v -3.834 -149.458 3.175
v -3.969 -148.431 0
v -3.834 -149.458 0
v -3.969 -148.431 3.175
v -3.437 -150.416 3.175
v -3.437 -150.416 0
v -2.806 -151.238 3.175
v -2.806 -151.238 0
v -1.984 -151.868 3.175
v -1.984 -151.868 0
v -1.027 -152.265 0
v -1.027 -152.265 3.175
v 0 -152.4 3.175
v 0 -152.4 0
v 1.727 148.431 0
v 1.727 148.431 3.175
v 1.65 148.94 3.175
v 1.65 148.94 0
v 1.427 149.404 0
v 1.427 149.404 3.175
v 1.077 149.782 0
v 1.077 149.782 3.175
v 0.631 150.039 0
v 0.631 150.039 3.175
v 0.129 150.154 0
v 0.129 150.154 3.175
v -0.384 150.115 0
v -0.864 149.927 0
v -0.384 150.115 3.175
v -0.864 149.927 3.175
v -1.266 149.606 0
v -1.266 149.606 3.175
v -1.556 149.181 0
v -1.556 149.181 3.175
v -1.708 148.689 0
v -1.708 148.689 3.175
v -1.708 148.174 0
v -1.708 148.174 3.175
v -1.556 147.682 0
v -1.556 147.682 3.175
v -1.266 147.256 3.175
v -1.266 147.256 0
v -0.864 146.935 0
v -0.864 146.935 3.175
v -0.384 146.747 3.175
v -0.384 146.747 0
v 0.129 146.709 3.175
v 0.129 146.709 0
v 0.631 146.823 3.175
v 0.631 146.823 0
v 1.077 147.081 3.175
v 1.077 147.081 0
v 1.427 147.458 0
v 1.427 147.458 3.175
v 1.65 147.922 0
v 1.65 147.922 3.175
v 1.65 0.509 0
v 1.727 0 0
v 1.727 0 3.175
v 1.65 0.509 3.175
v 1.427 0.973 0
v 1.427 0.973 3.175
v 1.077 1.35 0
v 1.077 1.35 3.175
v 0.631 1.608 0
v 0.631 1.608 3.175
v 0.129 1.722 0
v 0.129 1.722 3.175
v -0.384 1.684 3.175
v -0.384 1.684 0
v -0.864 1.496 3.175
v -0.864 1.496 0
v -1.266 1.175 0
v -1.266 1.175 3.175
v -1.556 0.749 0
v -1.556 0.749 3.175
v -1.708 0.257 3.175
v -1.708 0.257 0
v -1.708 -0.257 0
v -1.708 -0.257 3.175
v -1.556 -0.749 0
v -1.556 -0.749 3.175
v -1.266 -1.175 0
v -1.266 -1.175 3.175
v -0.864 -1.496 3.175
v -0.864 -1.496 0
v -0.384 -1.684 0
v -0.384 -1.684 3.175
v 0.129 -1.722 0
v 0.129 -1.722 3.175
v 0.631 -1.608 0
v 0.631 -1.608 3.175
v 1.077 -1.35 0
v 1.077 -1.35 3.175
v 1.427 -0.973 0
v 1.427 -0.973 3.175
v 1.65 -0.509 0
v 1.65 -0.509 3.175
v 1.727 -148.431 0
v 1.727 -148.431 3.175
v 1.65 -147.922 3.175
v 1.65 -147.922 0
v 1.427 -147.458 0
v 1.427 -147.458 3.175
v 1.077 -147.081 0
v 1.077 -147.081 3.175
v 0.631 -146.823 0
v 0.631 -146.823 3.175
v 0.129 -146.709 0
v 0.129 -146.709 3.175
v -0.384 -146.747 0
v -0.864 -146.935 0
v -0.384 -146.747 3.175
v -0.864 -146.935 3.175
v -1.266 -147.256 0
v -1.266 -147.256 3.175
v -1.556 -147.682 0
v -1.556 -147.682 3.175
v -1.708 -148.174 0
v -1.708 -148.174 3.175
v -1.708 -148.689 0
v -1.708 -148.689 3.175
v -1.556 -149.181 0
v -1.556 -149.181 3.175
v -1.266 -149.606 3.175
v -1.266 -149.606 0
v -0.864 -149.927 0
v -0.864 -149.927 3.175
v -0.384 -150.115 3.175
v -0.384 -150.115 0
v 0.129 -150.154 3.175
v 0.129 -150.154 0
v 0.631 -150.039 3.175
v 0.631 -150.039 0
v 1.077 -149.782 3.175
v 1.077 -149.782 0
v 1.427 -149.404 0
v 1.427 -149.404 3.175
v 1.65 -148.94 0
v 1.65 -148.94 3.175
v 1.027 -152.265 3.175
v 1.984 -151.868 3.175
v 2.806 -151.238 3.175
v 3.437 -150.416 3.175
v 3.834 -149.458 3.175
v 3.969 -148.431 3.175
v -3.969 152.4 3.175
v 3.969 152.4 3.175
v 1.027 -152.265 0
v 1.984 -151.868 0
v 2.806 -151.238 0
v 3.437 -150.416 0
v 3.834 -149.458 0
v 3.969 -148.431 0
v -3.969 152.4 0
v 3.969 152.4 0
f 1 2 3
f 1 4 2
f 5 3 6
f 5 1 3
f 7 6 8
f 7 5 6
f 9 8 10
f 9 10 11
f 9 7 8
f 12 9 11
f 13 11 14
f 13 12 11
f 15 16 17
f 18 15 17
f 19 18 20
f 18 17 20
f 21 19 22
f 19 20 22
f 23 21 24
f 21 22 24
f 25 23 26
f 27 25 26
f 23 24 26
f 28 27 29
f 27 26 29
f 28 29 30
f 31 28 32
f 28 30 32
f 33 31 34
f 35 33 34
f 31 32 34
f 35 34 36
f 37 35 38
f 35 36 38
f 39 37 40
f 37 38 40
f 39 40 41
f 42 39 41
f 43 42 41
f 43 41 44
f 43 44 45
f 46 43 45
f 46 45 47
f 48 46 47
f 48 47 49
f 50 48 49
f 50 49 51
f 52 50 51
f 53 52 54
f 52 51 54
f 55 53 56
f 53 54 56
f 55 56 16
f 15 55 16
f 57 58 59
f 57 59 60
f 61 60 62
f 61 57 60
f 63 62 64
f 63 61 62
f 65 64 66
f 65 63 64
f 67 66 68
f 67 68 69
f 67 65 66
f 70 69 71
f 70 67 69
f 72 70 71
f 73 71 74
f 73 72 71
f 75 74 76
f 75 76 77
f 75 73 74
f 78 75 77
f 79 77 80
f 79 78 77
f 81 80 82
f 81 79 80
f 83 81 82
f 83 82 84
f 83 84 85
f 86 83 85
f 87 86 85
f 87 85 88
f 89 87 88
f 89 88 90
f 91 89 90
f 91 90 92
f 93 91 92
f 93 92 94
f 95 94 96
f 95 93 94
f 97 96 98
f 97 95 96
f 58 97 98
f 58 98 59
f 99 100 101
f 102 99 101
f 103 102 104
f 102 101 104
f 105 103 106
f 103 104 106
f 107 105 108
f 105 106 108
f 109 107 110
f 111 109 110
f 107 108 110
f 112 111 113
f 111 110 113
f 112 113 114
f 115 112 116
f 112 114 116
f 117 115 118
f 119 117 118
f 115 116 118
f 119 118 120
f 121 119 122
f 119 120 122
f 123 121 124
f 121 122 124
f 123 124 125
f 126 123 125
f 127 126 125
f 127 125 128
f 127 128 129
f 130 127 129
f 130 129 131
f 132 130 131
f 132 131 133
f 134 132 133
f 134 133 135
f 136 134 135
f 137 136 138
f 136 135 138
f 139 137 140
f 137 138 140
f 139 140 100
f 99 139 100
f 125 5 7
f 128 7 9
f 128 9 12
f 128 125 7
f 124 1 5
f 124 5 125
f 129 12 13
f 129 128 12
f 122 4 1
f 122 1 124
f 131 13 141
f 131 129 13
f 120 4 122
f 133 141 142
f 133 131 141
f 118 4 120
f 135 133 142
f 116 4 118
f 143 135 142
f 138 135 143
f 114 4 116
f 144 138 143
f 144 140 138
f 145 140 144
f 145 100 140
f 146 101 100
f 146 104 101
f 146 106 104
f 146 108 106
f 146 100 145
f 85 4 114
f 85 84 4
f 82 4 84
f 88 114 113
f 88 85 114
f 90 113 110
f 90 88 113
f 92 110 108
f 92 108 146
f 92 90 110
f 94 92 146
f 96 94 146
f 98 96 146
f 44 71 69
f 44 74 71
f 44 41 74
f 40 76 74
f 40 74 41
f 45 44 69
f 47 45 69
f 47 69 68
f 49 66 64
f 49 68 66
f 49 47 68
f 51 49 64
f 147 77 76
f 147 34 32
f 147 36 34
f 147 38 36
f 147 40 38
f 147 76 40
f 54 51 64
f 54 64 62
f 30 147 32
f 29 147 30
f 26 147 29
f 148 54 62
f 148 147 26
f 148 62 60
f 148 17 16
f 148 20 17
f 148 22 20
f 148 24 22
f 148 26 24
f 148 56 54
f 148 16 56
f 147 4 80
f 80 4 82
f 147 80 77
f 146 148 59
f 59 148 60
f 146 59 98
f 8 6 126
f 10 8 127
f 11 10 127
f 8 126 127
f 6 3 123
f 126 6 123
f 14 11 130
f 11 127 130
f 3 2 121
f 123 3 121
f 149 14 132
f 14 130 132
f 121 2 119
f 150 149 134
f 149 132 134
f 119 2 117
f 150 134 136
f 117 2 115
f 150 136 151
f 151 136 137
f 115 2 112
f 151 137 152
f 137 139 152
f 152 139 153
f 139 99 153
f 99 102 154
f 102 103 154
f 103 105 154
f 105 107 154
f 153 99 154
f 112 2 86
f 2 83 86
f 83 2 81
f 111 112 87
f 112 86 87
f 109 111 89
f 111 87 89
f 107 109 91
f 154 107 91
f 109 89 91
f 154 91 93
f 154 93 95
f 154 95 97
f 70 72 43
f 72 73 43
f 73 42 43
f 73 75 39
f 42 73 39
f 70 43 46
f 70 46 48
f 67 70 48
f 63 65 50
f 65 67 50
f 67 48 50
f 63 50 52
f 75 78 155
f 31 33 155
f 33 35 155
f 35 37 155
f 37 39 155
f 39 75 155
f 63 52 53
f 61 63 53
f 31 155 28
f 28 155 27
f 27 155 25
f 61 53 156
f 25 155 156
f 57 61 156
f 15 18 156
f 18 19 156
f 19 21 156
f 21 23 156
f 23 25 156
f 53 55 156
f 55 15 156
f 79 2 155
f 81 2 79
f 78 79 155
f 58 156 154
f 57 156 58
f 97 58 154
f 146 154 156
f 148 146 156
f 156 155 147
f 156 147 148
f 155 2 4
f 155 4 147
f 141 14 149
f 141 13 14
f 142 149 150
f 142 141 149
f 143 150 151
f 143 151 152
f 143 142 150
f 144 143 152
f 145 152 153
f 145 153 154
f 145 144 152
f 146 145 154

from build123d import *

# Parameters (mm, degrees)
F0_W     = 7.9375
F0_H     = 304.8
F0_R     = 1.7272
F1_DEPTH = 3.175
F2_R     = 1.7272
F3_DEPTH = 3.175
F4_R     = 3.96874


# Not quite as in the source:
# - a fillet or chamfer is up to 0.001 mm smaller than in the source, because OpenCascade refuses the exact size


with BuildPart() as f1:
    # F0 (on Top) → F1 (new body)
    with BuildSketch(Plane.XY):
        Rectangle(F0_W, F0_H)
        Circle(F0_R, mode=Mode.SUBTRACT)
    extrude(amount=F1_DEPTH)

    # F2 (on face) → F3 (cut, through all)
    with BuildSketch(Plane.XY.offset(3.175)):
        with Locations((0, 148.43125)):
            Circle(F2_R)
        with Locations((0, -148.43125)):
            Circle(F2_R)
    extrude(amount=-F3_DEPTH, mode=Mode.SUBTRACT)

    # F4 (radius 3.96875 in the source; OpenCascade refuses exactly that, so slightly less here)
    f4_edges = [f1.edges().sort_by_distance(p)[0] for p in [
        (-3.96875, -152.4, 1.5875),
        (3.96875, -152.4, 1.5875),
    ]]
    fillet(f4_edges, radius=F4_R)


solid = f1.part
